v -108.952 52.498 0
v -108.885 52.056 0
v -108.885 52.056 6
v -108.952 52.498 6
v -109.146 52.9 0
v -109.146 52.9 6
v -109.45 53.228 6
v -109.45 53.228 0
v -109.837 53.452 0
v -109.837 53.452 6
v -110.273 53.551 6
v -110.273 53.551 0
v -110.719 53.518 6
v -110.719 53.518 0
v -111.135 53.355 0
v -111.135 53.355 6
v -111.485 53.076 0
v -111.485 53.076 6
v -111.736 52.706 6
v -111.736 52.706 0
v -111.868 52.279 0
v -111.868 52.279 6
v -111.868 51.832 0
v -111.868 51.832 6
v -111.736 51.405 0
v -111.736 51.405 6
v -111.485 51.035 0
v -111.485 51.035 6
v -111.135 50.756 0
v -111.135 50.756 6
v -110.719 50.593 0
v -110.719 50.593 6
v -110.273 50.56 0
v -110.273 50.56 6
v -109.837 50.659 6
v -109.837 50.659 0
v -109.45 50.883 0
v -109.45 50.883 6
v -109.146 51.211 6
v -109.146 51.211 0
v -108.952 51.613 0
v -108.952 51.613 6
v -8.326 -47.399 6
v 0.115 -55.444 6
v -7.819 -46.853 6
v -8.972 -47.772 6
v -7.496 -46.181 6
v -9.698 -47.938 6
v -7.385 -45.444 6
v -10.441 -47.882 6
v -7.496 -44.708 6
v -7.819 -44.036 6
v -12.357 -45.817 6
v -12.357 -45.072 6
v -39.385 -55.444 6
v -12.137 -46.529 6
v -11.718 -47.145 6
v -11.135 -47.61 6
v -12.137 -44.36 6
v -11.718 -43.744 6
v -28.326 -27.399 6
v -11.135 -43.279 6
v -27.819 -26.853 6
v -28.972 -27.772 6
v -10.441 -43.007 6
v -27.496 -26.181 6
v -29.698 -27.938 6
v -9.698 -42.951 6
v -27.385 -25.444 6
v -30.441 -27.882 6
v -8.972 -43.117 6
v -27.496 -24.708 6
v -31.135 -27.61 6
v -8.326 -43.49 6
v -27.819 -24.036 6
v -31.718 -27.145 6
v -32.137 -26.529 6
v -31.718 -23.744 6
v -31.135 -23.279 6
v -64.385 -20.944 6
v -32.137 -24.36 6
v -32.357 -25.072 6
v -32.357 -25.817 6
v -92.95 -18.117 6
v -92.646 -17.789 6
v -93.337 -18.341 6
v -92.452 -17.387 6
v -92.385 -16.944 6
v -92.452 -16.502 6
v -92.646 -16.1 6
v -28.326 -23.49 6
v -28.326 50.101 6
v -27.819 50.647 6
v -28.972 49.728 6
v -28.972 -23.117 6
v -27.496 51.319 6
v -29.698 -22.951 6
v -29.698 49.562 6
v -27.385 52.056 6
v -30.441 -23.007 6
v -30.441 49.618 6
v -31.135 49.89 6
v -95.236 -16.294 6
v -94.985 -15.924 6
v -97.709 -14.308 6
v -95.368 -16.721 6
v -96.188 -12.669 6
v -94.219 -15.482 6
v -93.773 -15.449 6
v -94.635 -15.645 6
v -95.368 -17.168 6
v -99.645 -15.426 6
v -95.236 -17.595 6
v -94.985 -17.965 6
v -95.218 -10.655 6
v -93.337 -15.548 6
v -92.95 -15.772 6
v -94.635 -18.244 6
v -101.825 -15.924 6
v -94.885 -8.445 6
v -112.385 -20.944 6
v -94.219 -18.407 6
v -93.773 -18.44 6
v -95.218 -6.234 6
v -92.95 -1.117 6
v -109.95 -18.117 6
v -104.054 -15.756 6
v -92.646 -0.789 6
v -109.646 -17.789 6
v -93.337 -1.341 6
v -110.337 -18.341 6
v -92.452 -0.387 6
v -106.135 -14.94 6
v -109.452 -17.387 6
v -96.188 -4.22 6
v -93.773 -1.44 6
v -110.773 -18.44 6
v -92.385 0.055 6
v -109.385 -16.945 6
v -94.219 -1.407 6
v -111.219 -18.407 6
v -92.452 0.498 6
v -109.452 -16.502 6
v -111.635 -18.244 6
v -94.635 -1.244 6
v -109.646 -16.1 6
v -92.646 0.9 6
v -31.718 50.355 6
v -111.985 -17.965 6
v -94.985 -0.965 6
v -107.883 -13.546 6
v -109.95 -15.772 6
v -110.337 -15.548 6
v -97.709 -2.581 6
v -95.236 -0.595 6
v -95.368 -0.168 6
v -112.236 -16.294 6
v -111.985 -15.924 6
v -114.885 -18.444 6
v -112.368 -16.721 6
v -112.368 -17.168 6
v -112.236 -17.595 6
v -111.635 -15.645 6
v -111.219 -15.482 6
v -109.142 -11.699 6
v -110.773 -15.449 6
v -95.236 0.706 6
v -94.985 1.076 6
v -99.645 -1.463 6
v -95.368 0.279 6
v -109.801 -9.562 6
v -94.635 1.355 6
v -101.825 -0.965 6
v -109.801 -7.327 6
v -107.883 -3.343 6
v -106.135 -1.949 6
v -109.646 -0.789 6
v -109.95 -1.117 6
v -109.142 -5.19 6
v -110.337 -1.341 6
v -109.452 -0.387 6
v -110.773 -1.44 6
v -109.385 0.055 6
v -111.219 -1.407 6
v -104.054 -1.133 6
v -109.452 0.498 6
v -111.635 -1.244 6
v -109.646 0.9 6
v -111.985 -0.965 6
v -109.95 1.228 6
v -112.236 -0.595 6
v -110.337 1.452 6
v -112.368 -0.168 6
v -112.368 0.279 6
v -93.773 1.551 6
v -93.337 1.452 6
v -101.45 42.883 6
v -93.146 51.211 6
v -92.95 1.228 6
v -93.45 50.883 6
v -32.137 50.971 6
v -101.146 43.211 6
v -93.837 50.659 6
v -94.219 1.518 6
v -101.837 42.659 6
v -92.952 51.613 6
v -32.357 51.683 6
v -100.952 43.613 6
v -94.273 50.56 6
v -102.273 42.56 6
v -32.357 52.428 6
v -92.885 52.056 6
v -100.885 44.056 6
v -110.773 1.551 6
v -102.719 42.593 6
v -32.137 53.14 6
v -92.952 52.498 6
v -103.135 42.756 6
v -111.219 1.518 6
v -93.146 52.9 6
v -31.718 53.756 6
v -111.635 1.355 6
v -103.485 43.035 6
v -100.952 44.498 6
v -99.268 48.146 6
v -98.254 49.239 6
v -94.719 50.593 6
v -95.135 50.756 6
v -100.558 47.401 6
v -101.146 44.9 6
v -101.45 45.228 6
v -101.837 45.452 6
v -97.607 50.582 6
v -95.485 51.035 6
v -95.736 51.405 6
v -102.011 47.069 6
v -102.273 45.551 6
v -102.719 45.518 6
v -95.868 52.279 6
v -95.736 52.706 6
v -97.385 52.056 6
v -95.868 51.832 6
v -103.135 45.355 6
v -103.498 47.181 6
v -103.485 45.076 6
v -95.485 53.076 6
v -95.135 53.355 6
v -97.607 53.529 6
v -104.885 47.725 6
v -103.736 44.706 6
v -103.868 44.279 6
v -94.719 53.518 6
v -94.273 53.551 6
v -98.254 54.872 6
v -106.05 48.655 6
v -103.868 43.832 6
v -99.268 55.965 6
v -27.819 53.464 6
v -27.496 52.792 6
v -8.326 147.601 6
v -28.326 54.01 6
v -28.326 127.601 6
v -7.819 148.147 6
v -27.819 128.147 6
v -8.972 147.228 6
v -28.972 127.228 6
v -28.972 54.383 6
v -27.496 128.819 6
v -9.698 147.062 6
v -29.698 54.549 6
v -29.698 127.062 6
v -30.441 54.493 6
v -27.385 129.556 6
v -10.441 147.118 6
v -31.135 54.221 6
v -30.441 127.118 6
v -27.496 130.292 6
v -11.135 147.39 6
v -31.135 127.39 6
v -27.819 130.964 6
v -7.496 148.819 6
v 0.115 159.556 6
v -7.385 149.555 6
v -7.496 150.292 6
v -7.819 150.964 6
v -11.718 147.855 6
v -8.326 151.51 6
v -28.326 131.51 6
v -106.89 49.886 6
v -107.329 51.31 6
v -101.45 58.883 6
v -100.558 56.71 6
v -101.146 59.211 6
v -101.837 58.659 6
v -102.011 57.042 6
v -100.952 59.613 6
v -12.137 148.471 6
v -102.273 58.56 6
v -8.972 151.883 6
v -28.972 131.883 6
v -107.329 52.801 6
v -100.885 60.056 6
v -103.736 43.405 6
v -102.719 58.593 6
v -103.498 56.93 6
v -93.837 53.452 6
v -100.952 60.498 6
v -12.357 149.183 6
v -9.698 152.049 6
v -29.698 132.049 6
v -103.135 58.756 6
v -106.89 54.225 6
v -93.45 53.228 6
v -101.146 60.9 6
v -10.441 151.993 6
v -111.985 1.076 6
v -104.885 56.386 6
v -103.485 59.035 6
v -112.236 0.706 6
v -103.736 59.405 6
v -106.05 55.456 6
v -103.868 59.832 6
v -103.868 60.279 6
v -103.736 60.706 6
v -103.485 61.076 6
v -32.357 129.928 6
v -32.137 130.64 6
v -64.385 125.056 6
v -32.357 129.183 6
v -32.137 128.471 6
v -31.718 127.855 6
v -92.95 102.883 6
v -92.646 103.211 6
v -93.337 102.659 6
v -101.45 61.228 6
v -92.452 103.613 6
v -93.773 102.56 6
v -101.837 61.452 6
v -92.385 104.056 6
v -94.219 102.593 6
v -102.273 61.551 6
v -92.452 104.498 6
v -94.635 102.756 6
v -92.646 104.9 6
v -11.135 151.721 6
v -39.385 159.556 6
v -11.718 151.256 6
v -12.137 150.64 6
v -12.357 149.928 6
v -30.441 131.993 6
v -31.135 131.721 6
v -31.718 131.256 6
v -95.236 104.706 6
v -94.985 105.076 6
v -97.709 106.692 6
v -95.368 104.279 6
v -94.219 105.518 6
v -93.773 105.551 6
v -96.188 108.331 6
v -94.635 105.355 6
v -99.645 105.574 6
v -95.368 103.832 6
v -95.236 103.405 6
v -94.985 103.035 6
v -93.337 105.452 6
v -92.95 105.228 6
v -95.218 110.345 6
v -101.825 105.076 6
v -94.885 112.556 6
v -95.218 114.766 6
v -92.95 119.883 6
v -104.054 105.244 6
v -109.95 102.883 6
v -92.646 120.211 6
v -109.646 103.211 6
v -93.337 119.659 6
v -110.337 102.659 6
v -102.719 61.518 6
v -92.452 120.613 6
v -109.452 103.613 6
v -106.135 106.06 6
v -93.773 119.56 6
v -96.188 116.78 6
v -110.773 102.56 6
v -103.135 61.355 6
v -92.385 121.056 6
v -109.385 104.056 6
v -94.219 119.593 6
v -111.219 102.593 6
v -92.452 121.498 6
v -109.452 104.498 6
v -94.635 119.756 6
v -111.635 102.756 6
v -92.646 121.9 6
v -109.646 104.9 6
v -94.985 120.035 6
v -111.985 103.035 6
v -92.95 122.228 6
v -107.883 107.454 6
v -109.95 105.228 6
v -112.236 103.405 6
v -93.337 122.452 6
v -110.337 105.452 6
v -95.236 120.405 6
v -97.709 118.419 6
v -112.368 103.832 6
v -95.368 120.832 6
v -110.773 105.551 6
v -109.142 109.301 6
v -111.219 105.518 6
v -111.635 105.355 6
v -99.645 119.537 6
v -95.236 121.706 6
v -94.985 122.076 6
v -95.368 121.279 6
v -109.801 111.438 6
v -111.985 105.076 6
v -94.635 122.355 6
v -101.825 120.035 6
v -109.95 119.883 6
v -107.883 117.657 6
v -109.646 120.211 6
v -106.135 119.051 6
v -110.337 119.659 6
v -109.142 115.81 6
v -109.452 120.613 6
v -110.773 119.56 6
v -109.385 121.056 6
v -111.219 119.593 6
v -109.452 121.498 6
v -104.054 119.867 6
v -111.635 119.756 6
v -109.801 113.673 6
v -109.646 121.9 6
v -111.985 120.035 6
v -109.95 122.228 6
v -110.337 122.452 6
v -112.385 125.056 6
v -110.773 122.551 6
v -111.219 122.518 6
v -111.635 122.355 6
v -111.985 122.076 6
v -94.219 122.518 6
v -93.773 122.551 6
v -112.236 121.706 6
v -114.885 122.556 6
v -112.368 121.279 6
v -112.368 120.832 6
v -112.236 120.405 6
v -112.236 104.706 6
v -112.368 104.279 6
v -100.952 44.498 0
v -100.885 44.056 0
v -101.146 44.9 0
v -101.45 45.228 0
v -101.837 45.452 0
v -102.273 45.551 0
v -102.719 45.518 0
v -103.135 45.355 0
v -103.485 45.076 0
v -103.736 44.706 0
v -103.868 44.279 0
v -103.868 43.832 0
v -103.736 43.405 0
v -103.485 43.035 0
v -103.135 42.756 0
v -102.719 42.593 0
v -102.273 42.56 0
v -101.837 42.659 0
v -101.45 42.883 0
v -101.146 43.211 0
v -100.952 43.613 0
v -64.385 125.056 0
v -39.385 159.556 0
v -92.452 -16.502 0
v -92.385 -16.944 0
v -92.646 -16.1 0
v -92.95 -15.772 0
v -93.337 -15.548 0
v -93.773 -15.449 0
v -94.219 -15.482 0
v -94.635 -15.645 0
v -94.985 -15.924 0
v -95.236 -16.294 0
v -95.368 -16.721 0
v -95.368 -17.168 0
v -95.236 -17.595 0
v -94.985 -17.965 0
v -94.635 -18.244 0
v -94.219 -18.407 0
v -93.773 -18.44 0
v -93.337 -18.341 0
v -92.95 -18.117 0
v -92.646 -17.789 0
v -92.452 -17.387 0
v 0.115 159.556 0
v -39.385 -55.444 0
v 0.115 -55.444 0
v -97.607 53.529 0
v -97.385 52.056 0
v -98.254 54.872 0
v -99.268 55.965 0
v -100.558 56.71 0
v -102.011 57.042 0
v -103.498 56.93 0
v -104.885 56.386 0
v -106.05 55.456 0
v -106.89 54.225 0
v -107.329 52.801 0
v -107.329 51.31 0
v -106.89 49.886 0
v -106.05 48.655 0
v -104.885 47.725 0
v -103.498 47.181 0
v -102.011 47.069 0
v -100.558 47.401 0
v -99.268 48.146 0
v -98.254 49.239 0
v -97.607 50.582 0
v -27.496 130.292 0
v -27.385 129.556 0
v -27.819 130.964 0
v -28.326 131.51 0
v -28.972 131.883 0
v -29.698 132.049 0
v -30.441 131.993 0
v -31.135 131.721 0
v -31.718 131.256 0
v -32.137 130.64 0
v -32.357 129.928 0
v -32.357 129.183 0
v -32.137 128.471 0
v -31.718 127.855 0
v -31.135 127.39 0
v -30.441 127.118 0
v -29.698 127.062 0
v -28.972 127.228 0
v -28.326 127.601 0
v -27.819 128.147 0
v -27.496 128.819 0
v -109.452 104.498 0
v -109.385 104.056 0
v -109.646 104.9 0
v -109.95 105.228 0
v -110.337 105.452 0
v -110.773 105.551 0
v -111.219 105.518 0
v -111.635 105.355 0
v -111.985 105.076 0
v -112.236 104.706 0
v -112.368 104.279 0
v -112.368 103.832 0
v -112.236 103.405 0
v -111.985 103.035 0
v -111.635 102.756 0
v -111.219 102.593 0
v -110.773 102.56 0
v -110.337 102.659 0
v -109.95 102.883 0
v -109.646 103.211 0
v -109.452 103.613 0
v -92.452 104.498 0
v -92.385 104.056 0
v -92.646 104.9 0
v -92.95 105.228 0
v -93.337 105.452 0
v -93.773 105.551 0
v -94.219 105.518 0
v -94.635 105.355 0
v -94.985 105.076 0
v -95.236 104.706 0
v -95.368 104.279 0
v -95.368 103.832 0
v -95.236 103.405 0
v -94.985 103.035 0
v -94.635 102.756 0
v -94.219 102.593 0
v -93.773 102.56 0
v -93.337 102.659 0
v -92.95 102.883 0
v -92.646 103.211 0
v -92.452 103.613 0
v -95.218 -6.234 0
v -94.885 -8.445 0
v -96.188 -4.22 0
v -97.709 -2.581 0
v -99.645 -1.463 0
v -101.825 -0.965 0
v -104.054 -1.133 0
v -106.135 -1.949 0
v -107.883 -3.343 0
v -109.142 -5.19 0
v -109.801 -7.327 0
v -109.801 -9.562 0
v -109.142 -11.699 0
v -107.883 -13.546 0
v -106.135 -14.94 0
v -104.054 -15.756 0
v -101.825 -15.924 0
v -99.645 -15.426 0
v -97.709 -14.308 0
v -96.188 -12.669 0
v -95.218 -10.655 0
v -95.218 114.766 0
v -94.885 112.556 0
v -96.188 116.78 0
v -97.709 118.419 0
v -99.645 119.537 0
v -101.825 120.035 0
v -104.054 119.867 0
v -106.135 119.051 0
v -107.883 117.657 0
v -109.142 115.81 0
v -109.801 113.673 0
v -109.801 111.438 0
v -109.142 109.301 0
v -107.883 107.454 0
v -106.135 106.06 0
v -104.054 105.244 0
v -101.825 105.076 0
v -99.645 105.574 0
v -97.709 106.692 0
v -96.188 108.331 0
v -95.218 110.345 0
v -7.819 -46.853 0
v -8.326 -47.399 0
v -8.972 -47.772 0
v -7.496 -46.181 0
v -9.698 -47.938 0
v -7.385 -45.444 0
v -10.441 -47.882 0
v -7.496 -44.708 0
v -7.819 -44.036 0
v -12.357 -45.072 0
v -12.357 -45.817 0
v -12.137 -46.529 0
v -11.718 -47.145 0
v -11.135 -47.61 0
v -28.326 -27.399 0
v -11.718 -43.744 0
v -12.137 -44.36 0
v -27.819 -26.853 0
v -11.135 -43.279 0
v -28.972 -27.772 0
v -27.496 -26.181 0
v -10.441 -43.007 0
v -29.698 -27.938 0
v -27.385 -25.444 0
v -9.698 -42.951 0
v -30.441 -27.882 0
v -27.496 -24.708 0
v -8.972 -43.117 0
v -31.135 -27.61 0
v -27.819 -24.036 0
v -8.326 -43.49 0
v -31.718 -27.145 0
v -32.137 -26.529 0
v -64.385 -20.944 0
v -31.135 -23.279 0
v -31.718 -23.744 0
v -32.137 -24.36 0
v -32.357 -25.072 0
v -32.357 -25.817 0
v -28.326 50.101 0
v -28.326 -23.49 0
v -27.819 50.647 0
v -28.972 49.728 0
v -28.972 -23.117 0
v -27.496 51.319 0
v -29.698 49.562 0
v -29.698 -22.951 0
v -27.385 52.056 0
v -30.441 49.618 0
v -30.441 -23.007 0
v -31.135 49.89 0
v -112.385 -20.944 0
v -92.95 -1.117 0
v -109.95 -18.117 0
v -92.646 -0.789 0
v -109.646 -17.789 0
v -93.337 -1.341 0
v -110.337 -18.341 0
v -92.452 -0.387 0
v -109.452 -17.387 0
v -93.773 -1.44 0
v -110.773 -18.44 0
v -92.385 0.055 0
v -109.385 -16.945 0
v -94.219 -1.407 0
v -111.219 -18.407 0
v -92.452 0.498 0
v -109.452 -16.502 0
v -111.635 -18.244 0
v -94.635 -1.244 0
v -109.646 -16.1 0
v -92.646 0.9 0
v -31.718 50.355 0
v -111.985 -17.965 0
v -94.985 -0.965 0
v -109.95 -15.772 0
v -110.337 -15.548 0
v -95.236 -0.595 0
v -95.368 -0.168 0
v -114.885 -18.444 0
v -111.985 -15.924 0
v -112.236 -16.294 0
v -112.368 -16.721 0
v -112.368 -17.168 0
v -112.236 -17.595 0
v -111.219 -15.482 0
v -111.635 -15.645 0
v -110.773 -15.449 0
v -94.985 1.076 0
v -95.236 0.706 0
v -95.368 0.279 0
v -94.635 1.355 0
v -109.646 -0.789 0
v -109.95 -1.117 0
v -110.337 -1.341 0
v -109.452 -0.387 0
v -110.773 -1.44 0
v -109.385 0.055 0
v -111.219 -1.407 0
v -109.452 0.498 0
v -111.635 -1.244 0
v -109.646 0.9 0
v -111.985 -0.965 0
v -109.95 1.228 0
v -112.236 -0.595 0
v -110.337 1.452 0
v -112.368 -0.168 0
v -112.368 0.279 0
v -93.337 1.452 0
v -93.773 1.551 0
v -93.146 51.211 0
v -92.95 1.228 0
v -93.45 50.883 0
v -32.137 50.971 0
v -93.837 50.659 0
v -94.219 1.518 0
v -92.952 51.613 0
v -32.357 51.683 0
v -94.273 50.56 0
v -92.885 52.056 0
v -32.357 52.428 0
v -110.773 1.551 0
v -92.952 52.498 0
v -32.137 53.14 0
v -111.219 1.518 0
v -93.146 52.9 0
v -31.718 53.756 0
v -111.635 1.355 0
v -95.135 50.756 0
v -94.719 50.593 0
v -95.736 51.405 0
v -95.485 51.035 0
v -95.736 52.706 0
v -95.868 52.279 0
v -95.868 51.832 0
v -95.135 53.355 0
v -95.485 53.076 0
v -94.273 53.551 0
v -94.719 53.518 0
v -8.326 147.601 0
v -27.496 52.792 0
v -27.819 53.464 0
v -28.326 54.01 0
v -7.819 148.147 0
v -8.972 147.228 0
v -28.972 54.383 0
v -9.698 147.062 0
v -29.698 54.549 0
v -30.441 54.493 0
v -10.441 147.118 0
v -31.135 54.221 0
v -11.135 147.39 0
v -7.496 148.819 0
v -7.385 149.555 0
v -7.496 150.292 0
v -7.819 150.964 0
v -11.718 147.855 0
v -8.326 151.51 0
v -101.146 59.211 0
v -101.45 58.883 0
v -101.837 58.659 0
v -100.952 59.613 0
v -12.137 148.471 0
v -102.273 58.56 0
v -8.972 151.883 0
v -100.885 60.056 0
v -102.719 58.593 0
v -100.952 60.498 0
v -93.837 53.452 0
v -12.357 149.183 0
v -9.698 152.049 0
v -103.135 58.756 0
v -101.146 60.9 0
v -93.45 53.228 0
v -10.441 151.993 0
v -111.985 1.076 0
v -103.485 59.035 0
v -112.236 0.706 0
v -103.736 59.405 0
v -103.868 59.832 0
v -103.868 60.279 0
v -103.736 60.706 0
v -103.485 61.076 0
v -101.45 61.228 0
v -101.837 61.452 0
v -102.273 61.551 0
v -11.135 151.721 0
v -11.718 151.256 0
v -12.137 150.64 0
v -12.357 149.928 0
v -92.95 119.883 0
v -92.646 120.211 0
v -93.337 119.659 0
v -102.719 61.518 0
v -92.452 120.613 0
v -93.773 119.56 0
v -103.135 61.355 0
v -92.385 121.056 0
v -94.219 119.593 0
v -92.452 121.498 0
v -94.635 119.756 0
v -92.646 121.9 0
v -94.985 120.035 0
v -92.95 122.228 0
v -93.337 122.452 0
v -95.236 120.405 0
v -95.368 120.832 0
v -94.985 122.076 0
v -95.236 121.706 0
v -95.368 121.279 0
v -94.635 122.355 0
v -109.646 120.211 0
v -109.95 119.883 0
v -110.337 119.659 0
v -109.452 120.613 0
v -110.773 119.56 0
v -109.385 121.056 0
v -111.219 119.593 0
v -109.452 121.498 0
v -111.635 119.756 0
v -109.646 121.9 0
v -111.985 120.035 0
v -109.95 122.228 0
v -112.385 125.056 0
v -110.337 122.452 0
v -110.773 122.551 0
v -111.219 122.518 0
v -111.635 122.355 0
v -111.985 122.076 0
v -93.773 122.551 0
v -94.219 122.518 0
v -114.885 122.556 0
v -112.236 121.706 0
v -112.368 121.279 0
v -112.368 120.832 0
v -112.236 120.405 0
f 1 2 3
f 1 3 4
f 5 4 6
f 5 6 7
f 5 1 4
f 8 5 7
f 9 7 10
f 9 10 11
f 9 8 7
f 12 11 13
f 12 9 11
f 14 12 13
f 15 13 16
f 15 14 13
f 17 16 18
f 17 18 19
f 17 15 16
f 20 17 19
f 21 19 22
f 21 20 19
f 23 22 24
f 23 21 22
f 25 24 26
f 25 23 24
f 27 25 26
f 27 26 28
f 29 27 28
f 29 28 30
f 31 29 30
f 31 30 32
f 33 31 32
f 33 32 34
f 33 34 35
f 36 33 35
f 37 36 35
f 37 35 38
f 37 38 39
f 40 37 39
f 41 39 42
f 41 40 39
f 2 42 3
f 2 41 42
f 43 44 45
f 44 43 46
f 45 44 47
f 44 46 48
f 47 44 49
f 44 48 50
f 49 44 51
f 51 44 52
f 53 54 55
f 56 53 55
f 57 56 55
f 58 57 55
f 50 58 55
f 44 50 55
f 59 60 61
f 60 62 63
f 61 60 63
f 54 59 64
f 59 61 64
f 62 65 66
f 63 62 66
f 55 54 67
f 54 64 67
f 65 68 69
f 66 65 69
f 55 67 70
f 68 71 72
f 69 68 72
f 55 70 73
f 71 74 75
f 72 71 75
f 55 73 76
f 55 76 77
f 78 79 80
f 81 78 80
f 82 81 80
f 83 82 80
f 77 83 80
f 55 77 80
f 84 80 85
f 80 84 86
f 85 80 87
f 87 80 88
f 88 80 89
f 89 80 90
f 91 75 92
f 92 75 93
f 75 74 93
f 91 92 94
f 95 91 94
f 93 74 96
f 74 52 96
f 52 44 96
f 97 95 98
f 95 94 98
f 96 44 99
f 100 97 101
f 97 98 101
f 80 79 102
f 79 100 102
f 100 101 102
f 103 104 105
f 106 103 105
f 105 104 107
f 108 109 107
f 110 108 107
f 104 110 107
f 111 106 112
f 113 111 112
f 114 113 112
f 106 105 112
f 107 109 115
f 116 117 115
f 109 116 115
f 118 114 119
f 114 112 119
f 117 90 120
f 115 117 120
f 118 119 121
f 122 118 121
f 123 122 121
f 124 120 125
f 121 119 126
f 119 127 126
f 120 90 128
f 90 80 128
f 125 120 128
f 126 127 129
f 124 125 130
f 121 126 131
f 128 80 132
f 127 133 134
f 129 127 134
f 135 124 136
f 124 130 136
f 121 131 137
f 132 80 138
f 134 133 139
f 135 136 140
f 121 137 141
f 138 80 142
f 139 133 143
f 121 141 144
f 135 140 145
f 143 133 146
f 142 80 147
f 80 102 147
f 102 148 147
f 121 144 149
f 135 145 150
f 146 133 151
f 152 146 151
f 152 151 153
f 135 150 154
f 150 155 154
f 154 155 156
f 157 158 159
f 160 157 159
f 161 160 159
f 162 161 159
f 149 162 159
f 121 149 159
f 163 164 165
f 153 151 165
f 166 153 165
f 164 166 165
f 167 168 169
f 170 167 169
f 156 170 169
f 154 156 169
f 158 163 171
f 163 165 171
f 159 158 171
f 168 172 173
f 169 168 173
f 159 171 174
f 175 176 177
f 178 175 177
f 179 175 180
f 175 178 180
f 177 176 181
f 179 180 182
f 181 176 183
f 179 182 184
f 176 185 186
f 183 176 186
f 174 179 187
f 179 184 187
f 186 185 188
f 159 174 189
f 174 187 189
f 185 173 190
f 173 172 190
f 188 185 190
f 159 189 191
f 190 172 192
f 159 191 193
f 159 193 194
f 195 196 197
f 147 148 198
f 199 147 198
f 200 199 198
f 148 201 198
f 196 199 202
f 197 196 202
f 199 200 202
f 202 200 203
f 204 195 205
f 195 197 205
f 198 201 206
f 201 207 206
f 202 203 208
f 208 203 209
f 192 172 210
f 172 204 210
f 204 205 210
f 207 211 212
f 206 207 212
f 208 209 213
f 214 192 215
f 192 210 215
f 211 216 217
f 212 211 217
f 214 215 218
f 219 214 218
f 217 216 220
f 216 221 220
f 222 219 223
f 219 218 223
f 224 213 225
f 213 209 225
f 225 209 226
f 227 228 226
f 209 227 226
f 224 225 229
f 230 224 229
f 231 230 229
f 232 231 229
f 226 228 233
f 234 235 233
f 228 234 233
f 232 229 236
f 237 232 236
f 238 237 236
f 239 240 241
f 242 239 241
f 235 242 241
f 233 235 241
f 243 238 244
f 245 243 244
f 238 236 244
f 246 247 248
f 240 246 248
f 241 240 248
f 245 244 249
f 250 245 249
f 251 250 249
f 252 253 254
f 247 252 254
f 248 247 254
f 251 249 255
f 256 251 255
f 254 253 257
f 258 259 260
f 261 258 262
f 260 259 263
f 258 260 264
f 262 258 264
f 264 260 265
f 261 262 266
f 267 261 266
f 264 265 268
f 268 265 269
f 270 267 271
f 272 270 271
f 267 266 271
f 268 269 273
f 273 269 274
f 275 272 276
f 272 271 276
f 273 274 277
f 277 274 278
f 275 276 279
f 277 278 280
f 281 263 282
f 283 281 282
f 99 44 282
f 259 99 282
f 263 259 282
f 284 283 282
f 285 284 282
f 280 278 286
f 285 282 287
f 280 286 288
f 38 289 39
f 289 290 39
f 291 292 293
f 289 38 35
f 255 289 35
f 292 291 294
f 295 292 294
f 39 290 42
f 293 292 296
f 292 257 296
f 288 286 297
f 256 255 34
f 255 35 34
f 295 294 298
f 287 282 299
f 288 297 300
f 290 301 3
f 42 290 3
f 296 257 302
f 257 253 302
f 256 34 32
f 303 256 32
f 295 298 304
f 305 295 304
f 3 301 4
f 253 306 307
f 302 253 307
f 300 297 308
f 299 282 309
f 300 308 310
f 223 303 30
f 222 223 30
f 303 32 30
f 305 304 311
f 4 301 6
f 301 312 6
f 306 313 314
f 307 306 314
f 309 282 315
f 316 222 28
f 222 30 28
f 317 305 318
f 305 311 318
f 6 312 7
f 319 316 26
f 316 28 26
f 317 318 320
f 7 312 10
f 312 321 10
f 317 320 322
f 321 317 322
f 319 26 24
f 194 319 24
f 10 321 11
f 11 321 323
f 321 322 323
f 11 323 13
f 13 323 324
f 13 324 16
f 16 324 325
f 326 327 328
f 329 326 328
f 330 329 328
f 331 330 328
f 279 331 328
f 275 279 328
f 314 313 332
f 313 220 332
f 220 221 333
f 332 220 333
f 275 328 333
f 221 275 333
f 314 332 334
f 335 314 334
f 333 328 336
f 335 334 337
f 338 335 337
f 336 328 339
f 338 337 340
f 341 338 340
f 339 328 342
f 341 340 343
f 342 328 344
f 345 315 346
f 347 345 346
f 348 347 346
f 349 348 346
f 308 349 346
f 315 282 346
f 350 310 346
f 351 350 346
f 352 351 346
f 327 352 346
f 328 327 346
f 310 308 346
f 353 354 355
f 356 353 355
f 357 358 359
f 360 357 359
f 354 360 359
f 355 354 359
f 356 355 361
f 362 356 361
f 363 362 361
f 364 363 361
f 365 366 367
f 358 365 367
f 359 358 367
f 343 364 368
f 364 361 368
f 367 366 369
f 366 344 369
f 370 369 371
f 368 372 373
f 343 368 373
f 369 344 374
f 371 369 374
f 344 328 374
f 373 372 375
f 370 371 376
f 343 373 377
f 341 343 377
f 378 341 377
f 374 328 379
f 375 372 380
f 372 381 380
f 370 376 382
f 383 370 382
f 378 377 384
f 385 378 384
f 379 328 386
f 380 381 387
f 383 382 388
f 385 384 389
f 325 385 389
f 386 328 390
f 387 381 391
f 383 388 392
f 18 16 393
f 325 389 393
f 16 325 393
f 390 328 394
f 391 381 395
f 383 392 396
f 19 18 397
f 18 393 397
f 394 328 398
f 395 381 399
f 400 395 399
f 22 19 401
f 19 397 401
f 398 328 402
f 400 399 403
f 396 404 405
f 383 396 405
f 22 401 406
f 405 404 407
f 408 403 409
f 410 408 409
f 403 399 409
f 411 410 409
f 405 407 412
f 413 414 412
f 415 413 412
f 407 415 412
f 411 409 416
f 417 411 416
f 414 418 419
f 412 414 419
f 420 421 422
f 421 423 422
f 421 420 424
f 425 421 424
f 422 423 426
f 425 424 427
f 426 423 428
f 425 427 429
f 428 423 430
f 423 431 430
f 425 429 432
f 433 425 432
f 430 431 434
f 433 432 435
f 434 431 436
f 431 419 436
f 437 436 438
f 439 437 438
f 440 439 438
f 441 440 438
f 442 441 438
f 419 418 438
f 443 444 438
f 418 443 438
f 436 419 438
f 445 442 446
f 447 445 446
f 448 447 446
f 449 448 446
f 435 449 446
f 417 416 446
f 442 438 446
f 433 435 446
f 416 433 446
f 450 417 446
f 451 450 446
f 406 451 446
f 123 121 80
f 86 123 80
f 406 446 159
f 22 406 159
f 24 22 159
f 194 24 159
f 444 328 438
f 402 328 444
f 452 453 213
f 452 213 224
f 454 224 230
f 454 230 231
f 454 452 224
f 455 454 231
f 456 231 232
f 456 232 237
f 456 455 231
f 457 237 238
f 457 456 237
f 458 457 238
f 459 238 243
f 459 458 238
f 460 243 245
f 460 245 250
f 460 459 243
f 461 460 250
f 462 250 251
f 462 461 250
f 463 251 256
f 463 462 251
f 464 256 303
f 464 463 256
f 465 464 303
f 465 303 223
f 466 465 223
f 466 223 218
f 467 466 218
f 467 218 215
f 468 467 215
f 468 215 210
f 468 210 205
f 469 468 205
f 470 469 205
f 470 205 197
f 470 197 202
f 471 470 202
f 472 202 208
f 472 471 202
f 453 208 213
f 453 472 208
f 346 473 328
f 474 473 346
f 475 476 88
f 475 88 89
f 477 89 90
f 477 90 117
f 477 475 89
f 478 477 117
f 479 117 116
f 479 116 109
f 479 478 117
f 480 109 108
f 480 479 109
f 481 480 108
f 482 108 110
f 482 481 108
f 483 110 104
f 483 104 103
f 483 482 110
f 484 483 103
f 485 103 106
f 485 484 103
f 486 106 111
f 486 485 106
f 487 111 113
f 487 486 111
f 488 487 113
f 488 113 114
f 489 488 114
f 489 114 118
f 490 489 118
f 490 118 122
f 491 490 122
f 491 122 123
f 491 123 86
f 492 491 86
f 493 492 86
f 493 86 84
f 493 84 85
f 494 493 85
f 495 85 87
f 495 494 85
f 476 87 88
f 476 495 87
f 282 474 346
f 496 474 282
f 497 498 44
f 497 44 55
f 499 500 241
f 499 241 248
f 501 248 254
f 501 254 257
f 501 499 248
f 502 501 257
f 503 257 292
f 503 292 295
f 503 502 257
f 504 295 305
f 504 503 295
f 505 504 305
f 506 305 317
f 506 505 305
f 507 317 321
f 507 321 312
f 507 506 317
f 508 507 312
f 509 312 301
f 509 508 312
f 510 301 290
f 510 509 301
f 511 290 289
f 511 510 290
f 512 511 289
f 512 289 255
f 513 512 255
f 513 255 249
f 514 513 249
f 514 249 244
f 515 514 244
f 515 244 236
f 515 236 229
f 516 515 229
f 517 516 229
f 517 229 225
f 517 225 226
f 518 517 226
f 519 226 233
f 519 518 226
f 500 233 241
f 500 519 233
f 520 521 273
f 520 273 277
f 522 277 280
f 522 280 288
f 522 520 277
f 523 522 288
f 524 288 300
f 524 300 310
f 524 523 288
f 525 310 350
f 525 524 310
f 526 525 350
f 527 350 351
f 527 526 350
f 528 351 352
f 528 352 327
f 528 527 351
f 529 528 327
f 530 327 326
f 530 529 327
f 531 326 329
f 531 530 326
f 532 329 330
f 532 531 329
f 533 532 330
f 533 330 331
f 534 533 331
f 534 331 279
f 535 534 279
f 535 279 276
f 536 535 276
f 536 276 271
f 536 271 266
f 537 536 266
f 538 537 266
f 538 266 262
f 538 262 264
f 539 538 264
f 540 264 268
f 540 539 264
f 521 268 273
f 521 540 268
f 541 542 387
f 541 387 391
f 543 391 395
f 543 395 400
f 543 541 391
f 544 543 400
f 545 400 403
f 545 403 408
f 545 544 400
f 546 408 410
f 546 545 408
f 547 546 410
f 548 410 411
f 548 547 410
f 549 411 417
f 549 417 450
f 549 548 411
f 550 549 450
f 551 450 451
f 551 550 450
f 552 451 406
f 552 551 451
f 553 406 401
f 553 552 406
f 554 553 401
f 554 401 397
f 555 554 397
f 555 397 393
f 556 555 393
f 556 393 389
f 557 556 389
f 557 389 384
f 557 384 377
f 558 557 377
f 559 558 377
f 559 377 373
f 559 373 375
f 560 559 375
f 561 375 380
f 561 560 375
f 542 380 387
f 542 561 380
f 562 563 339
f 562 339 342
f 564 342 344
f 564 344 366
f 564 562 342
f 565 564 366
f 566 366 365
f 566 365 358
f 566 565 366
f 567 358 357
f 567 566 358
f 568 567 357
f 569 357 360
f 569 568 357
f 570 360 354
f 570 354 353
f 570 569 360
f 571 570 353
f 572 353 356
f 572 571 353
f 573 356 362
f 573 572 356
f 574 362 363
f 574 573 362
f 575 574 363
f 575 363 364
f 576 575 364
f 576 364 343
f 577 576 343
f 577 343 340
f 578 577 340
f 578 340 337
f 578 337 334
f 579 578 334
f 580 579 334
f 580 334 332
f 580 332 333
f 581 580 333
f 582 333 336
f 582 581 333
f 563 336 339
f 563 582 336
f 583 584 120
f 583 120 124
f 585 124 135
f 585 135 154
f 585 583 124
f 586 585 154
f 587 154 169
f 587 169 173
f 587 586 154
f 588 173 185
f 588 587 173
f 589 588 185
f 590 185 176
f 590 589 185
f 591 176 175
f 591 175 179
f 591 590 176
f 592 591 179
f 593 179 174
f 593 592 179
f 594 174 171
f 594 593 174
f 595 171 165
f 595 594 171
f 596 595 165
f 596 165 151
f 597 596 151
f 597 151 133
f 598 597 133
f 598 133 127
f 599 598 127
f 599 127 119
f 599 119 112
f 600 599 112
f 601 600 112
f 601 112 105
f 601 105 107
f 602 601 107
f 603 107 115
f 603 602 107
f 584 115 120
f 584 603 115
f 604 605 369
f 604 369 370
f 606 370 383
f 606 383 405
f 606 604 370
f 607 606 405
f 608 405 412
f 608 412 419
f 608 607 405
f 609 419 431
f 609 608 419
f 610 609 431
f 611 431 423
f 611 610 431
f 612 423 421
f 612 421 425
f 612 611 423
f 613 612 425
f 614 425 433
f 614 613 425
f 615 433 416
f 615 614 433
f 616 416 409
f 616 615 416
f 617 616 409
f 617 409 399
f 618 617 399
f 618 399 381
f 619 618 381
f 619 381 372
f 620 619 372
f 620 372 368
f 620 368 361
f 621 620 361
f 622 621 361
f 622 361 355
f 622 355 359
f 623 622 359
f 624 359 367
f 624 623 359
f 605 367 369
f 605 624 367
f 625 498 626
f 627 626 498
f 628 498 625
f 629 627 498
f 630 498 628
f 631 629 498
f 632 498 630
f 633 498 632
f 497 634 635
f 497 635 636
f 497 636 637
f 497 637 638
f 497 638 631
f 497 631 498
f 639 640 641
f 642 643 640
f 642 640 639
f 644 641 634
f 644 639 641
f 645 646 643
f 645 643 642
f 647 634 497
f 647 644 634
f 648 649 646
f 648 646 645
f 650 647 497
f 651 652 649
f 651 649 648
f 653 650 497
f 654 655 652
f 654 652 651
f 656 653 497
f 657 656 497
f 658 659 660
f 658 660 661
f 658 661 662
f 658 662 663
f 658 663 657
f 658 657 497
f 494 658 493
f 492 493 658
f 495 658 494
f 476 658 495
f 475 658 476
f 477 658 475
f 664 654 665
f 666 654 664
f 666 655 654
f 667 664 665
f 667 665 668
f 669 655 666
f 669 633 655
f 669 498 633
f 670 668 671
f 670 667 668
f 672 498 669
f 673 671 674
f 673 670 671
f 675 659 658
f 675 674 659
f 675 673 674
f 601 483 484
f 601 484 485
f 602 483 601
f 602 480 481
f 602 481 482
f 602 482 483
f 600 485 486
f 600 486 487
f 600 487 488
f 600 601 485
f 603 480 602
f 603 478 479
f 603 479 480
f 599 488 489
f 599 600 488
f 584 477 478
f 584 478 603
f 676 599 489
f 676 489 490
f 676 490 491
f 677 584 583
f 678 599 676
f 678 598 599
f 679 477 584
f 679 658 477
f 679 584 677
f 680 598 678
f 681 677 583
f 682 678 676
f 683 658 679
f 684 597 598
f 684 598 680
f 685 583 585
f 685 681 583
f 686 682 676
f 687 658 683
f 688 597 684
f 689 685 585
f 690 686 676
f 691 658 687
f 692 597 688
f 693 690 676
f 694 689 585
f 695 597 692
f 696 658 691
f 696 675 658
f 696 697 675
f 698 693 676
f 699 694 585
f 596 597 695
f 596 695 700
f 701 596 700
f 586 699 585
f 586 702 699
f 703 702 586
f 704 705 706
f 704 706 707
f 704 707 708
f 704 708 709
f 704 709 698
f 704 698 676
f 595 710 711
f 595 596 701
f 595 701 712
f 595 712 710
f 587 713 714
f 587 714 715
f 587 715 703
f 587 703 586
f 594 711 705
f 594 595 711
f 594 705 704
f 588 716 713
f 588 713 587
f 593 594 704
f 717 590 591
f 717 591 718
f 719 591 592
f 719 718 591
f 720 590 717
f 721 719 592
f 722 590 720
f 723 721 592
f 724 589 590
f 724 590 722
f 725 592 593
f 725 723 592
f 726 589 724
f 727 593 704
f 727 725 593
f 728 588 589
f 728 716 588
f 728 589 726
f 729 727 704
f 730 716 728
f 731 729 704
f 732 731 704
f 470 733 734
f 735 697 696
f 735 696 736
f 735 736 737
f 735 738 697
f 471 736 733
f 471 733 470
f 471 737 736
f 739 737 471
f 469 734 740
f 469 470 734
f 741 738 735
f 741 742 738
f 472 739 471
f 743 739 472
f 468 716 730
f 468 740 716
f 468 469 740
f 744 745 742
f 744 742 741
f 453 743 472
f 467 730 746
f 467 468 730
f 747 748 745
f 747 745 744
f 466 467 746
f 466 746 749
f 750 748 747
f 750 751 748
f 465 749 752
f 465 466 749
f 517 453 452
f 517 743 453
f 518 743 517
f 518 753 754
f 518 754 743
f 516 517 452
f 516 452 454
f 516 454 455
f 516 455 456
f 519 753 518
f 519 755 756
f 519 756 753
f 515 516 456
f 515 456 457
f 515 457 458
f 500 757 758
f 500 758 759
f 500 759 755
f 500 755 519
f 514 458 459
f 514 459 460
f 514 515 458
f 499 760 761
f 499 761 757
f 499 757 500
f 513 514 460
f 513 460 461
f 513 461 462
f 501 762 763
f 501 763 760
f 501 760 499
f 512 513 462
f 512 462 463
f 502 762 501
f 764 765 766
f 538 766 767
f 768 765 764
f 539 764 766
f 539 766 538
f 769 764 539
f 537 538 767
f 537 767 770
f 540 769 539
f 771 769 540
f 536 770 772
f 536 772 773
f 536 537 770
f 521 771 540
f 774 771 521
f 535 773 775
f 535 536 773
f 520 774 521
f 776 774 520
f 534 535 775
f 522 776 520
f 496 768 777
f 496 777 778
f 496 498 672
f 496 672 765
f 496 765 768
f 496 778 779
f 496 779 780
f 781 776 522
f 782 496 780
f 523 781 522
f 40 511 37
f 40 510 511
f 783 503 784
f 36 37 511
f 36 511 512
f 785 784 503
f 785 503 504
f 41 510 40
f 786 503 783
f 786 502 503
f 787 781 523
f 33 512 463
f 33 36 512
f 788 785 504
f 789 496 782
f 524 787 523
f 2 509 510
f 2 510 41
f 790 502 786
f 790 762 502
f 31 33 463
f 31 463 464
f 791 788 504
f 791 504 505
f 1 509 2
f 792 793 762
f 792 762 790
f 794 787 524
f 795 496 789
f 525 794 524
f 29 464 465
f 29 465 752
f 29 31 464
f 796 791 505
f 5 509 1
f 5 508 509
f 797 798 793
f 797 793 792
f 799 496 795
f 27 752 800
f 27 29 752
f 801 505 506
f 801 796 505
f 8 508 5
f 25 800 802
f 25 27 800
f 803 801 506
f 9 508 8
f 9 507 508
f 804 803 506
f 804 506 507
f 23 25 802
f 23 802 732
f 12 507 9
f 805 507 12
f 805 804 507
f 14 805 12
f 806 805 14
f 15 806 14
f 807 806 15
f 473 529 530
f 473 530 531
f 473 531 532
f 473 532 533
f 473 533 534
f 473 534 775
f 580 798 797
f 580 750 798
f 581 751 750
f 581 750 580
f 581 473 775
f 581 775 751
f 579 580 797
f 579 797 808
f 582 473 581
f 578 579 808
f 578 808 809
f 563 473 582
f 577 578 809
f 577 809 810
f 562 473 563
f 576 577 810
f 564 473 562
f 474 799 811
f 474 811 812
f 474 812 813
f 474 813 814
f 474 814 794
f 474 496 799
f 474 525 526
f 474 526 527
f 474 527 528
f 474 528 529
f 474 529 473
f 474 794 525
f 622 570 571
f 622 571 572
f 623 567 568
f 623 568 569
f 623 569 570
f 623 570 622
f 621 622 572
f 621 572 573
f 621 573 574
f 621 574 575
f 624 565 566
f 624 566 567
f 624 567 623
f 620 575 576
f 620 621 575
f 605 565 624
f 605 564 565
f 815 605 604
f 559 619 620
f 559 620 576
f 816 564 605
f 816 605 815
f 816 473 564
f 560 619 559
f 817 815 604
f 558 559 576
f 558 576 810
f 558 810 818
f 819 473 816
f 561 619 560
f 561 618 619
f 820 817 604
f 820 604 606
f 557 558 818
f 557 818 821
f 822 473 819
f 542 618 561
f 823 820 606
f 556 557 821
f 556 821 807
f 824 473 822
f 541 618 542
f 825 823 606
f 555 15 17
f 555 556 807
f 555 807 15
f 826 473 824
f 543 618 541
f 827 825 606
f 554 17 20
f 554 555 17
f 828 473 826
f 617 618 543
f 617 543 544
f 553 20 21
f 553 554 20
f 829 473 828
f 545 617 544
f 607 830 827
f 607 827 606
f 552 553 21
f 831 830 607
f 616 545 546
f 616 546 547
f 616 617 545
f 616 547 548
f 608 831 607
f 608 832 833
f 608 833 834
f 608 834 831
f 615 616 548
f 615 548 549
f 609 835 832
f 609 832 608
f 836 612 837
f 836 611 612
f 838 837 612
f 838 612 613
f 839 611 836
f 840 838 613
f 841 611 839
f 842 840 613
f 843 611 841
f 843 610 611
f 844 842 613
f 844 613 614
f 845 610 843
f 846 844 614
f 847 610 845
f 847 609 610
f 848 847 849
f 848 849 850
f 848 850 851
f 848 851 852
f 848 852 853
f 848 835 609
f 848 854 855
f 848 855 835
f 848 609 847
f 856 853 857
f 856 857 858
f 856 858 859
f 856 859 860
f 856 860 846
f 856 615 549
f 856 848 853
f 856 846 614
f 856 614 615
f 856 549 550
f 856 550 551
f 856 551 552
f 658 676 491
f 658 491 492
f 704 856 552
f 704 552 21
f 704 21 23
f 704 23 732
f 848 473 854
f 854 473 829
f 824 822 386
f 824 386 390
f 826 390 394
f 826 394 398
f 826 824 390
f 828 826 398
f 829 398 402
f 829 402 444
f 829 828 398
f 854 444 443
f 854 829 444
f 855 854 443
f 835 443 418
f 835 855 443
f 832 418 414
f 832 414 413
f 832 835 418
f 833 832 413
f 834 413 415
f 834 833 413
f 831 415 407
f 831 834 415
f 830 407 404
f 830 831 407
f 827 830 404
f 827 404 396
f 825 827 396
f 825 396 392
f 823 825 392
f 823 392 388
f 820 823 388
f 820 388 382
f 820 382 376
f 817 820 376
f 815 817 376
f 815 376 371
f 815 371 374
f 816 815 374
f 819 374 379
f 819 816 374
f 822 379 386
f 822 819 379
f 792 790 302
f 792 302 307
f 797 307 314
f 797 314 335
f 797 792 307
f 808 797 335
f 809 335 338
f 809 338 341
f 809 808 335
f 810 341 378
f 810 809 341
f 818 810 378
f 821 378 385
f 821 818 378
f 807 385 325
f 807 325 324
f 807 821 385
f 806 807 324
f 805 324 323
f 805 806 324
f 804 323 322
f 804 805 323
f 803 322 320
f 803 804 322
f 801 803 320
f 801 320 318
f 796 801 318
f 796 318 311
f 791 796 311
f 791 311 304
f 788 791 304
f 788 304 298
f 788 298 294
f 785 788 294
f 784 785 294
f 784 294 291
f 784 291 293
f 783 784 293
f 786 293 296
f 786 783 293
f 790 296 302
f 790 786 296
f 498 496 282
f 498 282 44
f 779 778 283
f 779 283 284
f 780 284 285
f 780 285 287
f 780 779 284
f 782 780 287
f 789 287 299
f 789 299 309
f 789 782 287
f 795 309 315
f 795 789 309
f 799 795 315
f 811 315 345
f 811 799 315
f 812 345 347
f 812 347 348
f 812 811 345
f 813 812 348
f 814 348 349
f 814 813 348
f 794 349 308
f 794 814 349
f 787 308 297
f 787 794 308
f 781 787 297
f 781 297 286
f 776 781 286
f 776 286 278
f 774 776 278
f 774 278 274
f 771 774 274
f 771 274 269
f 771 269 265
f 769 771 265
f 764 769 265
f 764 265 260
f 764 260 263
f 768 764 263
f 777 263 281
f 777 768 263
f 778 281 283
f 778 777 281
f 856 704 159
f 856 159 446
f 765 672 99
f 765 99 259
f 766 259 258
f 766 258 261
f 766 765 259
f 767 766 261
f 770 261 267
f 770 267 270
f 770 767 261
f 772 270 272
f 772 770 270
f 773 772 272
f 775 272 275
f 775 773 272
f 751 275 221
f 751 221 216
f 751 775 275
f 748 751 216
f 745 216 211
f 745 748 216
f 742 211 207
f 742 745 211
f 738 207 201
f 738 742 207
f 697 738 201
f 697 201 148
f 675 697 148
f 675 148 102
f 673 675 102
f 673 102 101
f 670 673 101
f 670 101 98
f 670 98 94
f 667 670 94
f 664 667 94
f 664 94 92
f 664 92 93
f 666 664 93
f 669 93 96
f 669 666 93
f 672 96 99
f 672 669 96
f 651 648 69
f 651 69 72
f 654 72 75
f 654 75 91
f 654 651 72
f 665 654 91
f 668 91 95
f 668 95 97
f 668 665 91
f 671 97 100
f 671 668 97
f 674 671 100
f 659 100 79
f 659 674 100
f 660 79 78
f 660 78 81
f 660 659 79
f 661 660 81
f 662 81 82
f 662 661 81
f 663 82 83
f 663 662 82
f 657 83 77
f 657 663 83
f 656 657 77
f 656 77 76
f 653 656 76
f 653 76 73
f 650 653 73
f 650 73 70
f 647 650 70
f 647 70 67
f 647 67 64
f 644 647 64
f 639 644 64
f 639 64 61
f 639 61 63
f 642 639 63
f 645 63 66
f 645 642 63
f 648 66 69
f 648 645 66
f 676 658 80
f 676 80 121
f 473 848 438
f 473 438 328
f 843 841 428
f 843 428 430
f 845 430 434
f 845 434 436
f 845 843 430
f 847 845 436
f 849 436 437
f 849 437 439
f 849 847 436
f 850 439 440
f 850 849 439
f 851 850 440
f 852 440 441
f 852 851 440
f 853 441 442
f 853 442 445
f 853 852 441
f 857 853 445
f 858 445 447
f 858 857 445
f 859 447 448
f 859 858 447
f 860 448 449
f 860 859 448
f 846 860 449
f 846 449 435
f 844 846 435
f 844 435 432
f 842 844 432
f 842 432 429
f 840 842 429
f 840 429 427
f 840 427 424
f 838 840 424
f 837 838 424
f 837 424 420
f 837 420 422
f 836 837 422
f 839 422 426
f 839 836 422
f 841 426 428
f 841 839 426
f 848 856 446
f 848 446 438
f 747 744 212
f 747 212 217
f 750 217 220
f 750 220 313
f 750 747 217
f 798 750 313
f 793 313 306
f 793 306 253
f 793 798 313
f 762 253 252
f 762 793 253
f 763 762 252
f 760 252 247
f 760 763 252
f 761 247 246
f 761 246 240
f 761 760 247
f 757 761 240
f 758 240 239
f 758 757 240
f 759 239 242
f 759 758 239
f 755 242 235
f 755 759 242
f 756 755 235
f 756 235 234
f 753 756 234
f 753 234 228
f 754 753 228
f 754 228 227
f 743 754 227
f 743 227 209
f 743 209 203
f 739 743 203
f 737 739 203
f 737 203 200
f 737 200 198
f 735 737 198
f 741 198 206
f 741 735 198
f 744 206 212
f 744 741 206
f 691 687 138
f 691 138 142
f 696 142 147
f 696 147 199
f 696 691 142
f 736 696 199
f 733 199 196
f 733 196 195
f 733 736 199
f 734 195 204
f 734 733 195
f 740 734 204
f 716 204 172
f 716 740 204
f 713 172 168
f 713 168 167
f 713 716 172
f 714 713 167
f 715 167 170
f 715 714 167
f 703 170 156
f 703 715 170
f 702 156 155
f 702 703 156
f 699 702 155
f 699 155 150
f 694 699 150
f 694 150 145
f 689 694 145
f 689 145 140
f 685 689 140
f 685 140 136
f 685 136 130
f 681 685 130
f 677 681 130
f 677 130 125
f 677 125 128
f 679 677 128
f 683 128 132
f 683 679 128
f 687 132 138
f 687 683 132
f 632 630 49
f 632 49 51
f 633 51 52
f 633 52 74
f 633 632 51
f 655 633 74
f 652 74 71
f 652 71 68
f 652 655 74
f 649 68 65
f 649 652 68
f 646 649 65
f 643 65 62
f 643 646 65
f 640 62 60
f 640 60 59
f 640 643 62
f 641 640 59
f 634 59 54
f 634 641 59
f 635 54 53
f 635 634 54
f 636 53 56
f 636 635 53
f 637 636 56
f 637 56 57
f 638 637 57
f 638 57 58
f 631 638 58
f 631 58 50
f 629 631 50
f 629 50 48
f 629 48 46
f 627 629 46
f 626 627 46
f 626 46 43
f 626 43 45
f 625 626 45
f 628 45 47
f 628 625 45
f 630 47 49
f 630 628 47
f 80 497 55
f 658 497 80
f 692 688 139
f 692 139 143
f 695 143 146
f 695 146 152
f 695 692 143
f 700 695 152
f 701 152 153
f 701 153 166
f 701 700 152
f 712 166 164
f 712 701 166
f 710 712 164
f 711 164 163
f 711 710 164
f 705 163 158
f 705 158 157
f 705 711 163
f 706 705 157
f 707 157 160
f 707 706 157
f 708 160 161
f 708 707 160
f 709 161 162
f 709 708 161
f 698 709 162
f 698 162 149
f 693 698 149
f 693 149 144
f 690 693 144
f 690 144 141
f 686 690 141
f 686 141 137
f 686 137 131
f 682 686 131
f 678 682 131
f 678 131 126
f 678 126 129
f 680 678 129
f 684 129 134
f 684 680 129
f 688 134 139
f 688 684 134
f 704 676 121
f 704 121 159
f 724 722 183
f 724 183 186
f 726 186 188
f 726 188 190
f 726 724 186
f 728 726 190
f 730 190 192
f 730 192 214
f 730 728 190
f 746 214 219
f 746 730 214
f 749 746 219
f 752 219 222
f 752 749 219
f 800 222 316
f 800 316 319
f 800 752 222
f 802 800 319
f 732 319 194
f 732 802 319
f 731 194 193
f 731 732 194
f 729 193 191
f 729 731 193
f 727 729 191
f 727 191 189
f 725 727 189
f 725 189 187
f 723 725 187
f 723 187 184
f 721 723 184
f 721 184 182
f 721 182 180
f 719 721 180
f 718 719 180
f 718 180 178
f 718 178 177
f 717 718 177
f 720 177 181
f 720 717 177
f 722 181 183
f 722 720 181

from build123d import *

# Parameters (mm, degrees)
ESBO_O1_R                = 1.499999648
ESBO_O1_R_2              = 1.500000298
ESBO_O1_R_3              = 7.49999945
ESBO_O1_R_4              = 1.49999992
ESBO_O1_R_5              = 2.500000663
ESBO_O1_R_6              = 2.499999944
ESBO_O1_R_7              = 1.500000264
ESBO_O1_R_8              = 2.499997616
ESBO_O1_R_9              = 2.499998574
ESBO_O1_R_10             = 2.500000277
ESBO_O1_R_11             = 1.500000402
ESBO_O1_R_12             = 1.500002802
ESBO_O1_R_13             = 1.500001991
ESBO_O1_R_14             = 5.000001307
ESBO_O1_R_15             = 1.500000261
RESSALTO_EXTRUS_O1_DEPTH = 6


with BuildPart() as part:
    # Esboço1 → Ressalto-extrusão1 (new body)
    with BuildSketch(Plane.XY):
        Polygon((-39.385000246, 159.55550476), (0.115000002, 159.55550476), (0.115000002, -55.444498231), (-39.384998091, -55.444498231), (-64.385000326, -20.944499718), (-112.38500214, -20.944499718), (-114.885002049, -18.444498377), (-114.885002049, 122.555504246), (-112.385001967, 125.055501899), (-64.385002481, 125.055501899), align=None)
        with Locations((-110.885001778, 0.055499999)):
            Circle(ESBO_O1_R, mode=Mode.SUBTRACT)
        with Locations((-93.885001436, 0.055499999)):
            Circle(ESBO_O1_R_2, mode=Mode.SUBTRACT)
        with Locations((-102.385001898, -8.444500463)):
            Circle(ESBO_O1_R_3, mode=Mode.SUBTRACT)
        with Locations((-110.885002127, -16.944500925)):
            Circle(ESBO_O1_R_4, mode=Mode.SUBTRACT)
        with Locations((-29.885004915, -25.444498593)):
            Circle(ESBO_O1_R_5, mode=Mode.SUBTRACT)
        with Locations((-9.885005362, -45.444498612)):
            Circle(ESBO_O1_R_6, mode=Mode.SUBTRACT)
        with Locations((-93.885002367, -16.944499062)):
            Circle(ESBO_O1_R_7, mode=Mode.SUBTRACT)
        with Locations((-29.88500119, 52.055502934)):
            Circle(ESBO_O1_R_8, mode=Mode.SUBTRACT)
        with Locations((-9.885001637, 149.555499358)):
            Circle(ESBO_O1_R_9, mode=Mode.SUBTRACT)
        with Locations((-29.88500119, 129.55550353)):
            Circle(ESBO_O1_R_10, mode=Mode.SUBTRACT)
        with Locations((-102.385000966, 60.055504246)):
            Circle(ESBO_O1_R_11, mode=Mode.SUBTRACT)
        with Locations((-94.385001518, 52.055502934)):
            Circle(ESBO_O1_R_12, mode=Mode.SUBTRACT)
        with Locations((-110.385000997, 52.055502934)):
            Circle(ESBO_O1_R_13, mode=Mode.SUBTRACT)
        with Locations((-102.385000966, 52.055502934)):
            Circle(ESBO_O1_R_14, mode=Mode.SUBTRACT)
        with Locations((-102.385000966, 44.055505348)):
            Circle(ESBO_O1_R_15, mode=Mode.SUBTRACT)
        with Locations((-93.885002367, 121.055504931)):
            Circle(ESBO_O1_R_7, mode=Mode.SUBTRACT)
        with Locations((-110.885002127, 121.055506794)):
            Circle(ESBO_O1_R_4, mode=Mode.SUBTRACT)
        with Locations((-102.385001898, 112.555506332)):
            Circle(ESBO_O1_R_3, mode=Mode.SUBTRACT)
        with Locations((-93.885001436, 104.05550587)):
            Circle(ESBO_O1_R_2, mode=Mode.SUBTRACT)
        with Locations((-110.885001778, 104.05550587)):
            Circle(ESBO_O1_R, mode=Mode.SUBTRACT)
    extrude(amount=RESSALTO_EXTRUS_O1_DEPTH)


solid = part.part
